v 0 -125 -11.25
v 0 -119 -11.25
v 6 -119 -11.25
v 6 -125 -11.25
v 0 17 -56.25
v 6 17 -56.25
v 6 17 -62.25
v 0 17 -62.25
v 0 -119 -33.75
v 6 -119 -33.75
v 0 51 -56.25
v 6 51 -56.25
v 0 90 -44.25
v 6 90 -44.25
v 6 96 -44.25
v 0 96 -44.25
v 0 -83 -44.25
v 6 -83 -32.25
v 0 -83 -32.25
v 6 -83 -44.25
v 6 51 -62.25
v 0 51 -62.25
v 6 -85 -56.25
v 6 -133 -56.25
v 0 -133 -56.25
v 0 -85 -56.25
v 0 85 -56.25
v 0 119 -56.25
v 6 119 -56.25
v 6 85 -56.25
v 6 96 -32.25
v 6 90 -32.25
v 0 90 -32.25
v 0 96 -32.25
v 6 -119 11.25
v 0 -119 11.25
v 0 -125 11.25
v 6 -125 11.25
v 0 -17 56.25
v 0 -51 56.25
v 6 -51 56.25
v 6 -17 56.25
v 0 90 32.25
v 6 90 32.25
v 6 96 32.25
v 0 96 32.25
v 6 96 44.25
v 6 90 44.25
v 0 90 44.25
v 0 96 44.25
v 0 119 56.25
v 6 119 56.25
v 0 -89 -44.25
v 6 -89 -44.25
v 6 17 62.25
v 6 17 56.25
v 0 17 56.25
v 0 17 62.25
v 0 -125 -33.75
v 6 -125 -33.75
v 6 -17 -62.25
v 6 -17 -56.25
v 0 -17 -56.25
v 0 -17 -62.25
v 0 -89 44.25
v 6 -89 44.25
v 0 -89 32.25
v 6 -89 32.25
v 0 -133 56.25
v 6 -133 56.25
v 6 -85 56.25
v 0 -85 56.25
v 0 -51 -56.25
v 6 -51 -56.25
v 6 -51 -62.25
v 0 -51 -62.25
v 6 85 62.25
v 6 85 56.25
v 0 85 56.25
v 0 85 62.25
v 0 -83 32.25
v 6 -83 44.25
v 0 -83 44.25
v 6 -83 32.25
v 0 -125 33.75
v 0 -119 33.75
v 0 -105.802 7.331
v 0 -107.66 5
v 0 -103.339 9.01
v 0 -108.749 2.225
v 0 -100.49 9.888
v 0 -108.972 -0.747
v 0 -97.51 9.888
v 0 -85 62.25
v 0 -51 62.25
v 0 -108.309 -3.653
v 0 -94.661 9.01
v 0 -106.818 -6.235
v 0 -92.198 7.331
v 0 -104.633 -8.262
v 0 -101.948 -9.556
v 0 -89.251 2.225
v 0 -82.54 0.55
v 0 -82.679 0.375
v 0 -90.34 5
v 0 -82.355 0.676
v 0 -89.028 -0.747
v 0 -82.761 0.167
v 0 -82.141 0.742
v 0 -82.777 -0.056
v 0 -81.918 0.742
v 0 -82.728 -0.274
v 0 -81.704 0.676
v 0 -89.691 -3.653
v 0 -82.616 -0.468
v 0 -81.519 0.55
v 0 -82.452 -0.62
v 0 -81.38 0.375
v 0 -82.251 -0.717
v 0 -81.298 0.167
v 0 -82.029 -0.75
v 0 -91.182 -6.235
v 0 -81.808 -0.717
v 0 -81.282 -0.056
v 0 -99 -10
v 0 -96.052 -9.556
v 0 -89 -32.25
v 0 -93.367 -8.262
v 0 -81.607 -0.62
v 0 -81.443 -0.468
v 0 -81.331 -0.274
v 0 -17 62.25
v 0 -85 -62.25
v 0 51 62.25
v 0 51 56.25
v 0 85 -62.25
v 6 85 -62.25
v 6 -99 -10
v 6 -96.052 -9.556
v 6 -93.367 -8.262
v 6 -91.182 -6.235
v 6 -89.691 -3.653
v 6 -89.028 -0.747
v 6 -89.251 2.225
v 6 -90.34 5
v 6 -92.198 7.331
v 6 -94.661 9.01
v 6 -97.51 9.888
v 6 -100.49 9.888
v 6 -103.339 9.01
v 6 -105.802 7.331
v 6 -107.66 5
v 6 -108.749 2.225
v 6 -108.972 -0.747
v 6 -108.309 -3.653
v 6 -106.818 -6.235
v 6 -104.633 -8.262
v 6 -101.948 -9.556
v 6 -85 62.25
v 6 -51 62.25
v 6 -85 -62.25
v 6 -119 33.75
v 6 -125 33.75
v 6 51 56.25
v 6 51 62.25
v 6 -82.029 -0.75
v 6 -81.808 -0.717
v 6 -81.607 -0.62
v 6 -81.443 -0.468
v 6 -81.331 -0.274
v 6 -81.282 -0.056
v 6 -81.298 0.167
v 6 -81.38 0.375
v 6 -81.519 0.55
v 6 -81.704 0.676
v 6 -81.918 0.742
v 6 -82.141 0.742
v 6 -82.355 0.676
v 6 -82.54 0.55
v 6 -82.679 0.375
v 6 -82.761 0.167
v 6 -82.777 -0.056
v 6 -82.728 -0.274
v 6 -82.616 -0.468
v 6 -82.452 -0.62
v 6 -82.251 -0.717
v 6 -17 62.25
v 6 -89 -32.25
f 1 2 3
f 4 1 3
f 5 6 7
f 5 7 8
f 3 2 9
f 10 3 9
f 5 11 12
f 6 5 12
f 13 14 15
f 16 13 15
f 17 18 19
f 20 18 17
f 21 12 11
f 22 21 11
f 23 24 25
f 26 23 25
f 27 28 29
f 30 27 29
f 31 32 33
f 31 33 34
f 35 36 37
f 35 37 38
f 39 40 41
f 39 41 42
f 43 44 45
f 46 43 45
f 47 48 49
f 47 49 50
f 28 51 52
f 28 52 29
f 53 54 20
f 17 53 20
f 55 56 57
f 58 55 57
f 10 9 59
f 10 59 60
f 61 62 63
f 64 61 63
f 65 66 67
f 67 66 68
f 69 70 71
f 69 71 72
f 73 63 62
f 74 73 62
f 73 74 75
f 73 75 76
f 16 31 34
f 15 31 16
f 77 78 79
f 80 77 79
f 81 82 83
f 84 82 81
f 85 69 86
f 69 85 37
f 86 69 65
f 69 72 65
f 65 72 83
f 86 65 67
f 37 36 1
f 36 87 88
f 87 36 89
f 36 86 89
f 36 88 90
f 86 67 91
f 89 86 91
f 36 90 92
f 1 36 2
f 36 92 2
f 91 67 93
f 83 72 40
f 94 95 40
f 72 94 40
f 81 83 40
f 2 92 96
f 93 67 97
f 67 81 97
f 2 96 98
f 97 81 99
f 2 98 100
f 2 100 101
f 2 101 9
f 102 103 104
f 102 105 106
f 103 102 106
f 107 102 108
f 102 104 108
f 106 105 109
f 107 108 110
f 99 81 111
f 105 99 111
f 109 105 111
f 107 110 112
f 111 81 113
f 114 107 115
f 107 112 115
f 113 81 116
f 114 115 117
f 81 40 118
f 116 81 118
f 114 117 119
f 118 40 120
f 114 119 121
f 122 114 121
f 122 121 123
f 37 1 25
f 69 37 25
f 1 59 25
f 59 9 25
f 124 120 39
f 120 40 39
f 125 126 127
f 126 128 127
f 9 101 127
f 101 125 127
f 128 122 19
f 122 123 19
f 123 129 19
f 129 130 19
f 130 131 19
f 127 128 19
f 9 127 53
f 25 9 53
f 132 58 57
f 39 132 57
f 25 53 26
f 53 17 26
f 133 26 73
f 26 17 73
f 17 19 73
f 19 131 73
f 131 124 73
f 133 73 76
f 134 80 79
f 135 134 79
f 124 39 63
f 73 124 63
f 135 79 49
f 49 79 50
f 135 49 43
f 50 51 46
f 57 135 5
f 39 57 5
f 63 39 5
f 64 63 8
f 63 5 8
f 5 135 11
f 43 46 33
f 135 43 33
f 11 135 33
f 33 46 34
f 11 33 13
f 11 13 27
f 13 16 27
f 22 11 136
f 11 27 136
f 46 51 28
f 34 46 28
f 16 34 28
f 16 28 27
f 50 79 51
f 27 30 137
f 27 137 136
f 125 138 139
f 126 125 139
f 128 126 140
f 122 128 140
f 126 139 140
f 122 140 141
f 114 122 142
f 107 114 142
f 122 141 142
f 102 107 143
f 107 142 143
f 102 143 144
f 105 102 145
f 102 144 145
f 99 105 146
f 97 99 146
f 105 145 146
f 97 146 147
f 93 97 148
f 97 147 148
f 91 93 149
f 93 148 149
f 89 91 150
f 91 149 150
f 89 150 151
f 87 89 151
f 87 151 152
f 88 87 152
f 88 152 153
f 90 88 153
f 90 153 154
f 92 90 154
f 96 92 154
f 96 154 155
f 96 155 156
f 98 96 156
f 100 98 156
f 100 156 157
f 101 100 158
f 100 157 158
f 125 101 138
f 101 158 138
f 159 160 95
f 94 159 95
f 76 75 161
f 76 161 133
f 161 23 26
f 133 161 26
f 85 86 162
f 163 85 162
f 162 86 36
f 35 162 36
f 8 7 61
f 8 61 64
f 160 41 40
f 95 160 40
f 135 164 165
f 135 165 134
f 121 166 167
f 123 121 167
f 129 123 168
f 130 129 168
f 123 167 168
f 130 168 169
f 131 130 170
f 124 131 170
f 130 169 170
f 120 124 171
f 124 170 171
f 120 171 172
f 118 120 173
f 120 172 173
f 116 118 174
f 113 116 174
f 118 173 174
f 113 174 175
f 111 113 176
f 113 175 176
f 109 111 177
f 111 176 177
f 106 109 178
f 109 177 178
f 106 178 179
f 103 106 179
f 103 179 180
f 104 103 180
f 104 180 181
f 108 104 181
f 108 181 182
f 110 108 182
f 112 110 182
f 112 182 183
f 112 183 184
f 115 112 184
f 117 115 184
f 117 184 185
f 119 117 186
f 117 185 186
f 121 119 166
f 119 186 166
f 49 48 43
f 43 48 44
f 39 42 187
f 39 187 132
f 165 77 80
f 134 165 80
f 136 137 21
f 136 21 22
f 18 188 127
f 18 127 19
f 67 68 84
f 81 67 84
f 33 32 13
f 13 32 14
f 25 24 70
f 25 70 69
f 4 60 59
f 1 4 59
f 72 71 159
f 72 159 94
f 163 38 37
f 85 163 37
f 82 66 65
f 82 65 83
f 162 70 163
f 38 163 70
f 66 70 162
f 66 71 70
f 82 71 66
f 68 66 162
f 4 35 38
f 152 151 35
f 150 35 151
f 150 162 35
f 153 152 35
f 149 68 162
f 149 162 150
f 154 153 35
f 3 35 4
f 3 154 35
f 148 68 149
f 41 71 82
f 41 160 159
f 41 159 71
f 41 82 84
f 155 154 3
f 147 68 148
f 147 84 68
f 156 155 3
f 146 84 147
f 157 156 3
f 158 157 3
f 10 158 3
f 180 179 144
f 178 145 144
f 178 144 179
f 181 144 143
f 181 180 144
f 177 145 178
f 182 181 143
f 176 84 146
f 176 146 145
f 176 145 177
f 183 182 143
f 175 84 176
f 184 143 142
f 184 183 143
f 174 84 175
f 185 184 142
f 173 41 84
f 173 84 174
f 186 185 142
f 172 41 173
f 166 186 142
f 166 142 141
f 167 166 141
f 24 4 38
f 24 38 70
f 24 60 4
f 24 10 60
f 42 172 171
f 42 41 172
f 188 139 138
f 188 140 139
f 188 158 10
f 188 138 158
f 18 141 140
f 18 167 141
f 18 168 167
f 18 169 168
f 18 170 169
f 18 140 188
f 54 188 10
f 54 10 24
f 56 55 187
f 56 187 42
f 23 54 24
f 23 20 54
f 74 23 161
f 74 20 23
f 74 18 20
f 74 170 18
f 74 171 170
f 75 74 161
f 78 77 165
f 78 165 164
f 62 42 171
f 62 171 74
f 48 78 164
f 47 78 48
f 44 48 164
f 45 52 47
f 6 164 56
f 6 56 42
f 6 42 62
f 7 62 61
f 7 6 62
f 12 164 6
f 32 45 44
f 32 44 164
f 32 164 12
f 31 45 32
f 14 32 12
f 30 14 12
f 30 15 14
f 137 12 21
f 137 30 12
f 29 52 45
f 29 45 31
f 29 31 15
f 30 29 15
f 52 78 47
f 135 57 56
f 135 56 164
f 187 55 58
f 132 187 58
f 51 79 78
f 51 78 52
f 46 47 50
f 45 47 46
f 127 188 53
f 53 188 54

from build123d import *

# Parameters (mm, degrees)
SKETCH1_W           = 112.5
SKETCH1_H           = 238
BOSS_EXTRUDE1_DEPTH = 6
SKETCH2_R           = 10
SKETCH2_R_2         = 0.75
CUT_EXTRUDE1_DEPTH  = 6
SKETCH3_W           = 12
SKETCH3_H           = 6
CUT_EXTRUDE2_DEPTH  = 6
SKETCH4_W           = 6
SKETCH4_H           = 22.5
BOSS_EXTRUDE2_DEPTH = 6
SKETCH5_W           = 12
SKETCH5_H           = 6
CUT_EXTRUDE3_DEPTH  = 6
SKETCH6_W           = 6
SKETCH6_H           = 34
BOSS_EXTRUDE3_DEPTH = 6
SKETCH7_W           = 6
SKETCH7_H           = 112.5
BOSS_EXTRUDE4_DEPTH = 8


with BuildPart() as part:
    # Sketch1 → Boss-Extrude1 (new body)
    with BuildSketch(Plane(origin=(0, 0, 0), x_dir=(0, 0, -1), z_dir=(1, 0, 0))):
        Rectangle(SKETCH1_W, SKETCH1_H)
    extrude(amount=BOSS_EXTRUDE1_DEPTH)

    # Sketch2 → Cut-Extrude1 (cut)
    with BuildSketch(Plane(origin=(6, 0, 0), x_dir=(0, 0, -1), z_dir=(1, 0, 0))):
        with Locations((0, -99)):
            Circle(SKETCH2_R)
        with Locations((0, -82.029437252)):
            Circle(SKETCH2_R_2)
    extrude(amount=-CUT_EXTRUDE1_DEPTH, mode=Mode.SUBTRACT)

    # Sketch3 → Cut-Extrude2 (cut)
    with BuildSketch(Plane(origin=(6, 0, 0), x_dir=(0, 0, -1), z_dir=(1, 0, 0))):
        with Locations((-38.25, -86)):
            Rectangle(SKETCH3_W, SKETCH3_H)
        with Locations((38.25, -86)):
            Rectangle(SKETCH3_W, SKETCH3_H)
    extrude(amount=-CUT_EXTRUDE2_DEPTH, mode=Mode.SUBTRACT)

    # Sketch4 → Boss-Extrude2 (add)
    with BuildSketch(Plane.XZ.offset(119)):
        with Locations((3, -45)):
            Rectangle(SKETCH4_W, SKETCH4_H)
        with Locations((3, 0)):
            Rectangle(SKETCH4_W, SKETCH4_H)
        with Locations((3, 45)):
            Rectangle(SKETCH4_W, SKETCH4_H)
    extrude(amount=BOSS_EXTRUDE2_DEPTH)

    # Sketch5 → Cut-Extrude3 (cut)
    with BuildSketch(Plane(origin=(6, 0, 0), x_dir=(0, 0, -1), z_dir=(1, 0, 0))):
        with Locations((-38.25, 93)):
            Rectangle(SKETCH5_W, SKETCH5_H)
        with Locations((38.25, 93)):
            Rectangle(SKETCH5_W, SKETCH5_H)
    extrude(amount=-CUT_EXTRUDE3_DEPTH, mode=Mode.SUBTRACT)

    # Sketch6 → Boss-Extrude3 (add)
    with BuildSketch(Plane(origin=(0, 0, -56.25), x_dir=(-1, 0, 0), z_dir=(0, 0, -1))):
        with Locations((-3, 68)):
            Rectangle(SKETCH6_W, SKETCH6_H)
        with Locations((-3, 0)):
            Rectangle(SKETCH6_W, SKETCH6_H)
        with Locations((-3, -68)):
            Rectangle(SKETCH6_W, SKETCH6_H)
    boss_extrude3 = extrude(amount=BOSS_EXTRUDE3_DEPTH)

    # Mirror1: Boss-Extrude3 across plane
    add(boss_extrude3.mirror(Plane.XY))

    # Sketch7 → Boss-Extrude4 (add)
    with BuildSketch(Plane(origin=(0, -125, 0), x_dir=(-1, 0, 0), z_dir=(0, -1, 0))):
        with Locations((-3, 0)):
            Rectangle(SKETCH7_W, SKETCH7_H)
    extrude(amount=BOSS_EXTRUDE4_DEPTH)


solid = part.part
